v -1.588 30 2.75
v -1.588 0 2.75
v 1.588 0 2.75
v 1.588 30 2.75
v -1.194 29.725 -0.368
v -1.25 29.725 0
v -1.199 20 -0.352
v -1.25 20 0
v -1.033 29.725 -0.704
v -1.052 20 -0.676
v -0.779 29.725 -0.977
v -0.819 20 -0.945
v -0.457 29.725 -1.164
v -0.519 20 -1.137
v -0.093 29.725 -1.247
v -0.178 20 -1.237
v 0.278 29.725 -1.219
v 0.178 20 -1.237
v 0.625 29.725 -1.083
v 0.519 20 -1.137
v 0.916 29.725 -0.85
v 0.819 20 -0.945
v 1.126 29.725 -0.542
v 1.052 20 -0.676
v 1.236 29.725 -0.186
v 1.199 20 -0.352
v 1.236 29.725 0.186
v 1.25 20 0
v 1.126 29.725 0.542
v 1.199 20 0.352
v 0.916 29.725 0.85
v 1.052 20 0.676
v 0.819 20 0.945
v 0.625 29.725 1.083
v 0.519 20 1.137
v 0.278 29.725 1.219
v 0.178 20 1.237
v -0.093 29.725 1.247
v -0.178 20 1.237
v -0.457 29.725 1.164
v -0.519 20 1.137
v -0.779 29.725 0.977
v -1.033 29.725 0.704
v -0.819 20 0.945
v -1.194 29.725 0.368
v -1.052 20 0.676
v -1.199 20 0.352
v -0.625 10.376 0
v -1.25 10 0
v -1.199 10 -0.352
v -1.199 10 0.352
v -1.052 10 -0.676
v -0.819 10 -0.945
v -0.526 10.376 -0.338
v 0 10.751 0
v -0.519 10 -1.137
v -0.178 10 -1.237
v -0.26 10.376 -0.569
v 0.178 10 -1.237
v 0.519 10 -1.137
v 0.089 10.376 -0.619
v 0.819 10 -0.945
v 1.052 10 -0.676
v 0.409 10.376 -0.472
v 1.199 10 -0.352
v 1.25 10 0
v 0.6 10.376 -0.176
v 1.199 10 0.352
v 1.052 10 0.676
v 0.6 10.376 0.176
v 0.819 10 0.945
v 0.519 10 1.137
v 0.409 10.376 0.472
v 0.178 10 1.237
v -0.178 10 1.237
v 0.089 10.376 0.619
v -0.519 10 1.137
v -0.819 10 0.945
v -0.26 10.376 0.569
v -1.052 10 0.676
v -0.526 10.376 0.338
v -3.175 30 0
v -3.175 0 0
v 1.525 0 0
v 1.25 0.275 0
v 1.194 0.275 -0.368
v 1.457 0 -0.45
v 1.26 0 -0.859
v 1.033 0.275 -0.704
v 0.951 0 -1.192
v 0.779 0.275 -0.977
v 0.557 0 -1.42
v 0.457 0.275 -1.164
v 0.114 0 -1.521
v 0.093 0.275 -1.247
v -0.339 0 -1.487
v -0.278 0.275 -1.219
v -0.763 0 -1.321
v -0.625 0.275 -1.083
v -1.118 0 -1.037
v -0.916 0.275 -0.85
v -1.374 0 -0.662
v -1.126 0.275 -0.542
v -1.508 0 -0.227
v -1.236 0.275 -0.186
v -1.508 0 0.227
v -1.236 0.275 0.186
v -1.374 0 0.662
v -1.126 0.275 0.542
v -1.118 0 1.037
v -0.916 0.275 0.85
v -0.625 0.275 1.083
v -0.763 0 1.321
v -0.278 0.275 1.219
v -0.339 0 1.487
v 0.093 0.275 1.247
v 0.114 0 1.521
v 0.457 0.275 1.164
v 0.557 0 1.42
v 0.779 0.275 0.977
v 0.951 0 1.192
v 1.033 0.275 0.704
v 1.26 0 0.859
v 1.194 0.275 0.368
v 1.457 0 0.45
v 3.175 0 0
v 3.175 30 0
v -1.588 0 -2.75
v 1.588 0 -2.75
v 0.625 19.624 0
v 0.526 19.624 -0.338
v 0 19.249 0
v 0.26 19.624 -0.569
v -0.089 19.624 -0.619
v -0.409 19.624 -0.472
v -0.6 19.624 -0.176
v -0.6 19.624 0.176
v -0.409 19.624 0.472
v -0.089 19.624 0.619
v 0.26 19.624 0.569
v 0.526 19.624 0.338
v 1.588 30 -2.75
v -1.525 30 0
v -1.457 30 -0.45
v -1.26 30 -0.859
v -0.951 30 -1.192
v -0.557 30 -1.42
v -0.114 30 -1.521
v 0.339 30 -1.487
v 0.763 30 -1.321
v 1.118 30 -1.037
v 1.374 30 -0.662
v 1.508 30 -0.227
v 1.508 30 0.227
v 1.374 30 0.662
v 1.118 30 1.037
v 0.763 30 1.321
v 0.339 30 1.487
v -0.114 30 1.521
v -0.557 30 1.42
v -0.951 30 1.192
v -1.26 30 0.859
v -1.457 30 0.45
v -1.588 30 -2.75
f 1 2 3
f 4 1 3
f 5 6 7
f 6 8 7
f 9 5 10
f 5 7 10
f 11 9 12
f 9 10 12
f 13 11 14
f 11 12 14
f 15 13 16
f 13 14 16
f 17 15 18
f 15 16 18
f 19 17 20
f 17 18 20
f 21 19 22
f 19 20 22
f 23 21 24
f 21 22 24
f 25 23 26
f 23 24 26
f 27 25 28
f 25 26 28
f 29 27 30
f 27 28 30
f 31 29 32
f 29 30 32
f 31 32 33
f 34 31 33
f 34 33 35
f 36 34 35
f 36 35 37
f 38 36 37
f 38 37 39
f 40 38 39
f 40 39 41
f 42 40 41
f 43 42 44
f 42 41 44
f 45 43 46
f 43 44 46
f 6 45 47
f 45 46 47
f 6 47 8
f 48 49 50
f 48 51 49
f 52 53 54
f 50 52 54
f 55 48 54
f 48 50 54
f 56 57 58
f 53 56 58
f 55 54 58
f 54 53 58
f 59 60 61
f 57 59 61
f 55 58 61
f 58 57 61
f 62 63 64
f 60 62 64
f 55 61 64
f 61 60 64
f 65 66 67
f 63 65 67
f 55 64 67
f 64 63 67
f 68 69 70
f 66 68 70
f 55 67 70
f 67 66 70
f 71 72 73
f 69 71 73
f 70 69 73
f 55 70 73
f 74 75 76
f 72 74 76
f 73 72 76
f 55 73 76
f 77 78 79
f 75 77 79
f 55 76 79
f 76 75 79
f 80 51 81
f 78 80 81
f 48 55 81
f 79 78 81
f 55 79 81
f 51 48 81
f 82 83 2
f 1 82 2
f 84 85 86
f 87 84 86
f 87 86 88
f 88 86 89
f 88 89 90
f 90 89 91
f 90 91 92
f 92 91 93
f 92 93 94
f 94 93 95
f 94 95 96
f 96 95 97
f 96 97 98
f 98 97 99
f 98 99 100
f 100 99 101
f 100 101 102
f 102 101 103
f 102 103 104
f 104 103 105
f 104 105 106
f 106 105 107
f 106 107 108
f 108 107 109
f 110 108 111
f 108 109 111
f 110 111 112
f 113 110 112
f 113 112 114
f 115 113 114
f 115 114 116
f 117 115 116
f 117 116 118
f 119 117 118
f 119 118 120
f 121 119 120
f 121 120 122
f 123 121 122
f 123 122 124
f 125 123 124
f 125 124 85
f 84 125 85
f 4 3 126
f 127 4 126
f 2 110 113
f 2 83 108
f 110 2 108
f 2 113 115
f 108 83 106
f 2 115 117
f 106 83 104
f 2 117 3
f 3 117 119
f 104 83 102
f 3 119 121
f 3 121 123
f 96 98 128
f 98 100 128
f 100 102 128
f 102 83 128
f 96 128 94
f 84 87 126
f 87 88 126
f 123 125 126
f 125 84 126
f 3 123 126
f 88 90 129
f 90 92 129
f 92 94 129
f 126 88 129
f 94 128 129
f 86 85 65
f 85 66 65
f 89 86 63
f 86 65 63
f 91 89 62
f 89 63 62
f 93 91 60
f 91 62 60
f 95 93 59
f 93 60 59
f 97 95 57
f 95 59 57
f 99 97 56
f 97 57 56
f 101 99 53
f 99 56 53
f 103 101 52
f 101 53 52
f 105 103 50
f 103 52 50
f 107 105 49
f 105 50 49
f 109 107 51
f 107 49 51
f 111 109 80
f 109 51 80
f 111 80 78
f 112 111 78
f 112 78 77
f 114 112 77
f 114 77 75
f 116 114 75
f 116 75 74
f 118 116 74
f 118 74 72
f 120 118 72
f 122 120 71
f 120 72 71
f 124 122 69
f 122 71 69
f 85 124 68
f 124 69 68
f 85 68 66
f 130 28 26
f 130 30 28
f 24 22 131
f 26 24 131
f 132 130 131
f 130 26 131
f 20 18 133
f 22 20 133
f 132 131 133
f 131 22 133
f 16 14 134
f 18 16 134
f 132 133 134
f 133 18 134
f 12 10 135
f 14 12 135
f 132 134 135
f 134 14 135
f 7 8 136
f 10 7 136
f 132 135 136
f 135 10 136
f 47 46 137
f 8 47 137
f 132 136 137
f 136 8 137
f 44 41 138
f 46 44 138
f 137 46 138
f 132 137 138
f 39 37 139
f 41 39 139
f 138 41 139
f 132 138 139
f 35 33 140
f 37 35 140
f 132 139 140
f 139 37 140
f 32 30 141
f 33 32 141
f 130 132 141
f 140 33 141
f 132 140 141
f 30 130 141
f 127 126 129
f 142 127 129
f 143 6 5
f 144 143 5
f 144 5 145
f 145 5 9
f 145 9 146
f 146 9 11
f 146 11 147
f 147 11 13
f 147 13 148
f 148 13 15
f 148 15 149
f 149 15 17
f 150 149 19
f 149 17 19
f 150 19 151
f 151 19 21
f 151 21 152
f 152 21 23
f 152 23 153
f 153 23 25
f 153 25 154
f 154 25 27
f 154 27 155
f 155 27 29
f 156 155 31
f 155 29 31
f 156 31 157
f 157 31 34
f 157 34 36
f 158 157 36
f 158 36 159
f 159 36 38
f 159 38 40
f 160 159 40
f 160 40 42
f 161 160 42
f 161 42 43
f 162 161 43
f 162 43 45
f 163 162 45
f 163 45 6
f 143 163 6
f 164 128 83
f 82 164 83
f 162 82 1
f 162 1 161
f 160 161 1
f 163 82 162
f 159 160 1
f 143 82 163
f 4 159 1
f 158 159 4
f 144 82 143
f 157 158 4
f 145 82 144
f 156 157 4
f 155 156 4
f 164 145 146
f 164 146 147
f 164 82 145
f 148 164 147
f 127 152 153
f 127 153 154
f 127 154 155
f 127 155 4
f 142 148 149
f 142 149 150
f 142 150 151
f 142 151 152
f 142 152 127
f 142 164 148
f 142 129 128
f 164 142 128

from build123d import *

# Parameters (mm, degrees)
EXTRUDE_1_DEPTH             = 30
M3_TAPPED_HOLE1_D           = 2.5
M3_TAPPED_HOLE1_DEPTH       = 10
M3_TAPPED_HOLE1_CSINK_D     = 3.05
M3_TAPPED_HOLE1_CSINK_ANGLE = 90
M3_TAPPED_HOLE1_TIP         = 0.751075774
M3_TAPPED_HOLE2_D           = 2.5
M3_TAPPED_HOLE2_DEPTH       = 10
M3_TAPPED_HOLE2_CSINK_D     = 3.05
M3_TAPPED_HOLE2_CSINK_ANGLE = 90
M3_TAPPED_HOLE2_TIP         = 0.751075774


with BuildPart() as part:
    # 草图1 → 凸台-拉伸1 (new body)
    with BuildSketch(Plane(origin=(0, 0, 0), x_dir=(1, 0, 0), z_dir=(0, 1, 0))):
        Polygon((3.175426481, 0), (1.58771324, 2.75), (-1.58771324, 2.75), (-3.175426481, 0), (-1.58771324, -2.75), (1.58771324, -2.75), align=None)
    extrude(amount=EXTRUDE_1_DEPTH)

    # M3 Tapped Hole1
    with Locations(Plane(origin=(0, 30, 0), x_dir=(1, 0, 0), z_dir=(0, 1, 0))):
        with Locations((0, 0)):
            CounterSinkHole(M3_TAPPED_HOLE1_D / 2, M3_TAPPED_HOLE1_CSINK_D / 2, depth=M3_TAPPED_HOLE1_DEPTH, counter_sink_angle=M3_TAPPED_HOLE1_CSINK_ANGLE)
            with Locations((0, 0, -(M3_TAPPED_HOLE1_DEPTH + M3_TAPPED_HOLE1_TIP / 2))):  # 118° drill point
                Cone(0, M3_TAPPED_HOLE1_D / 2, M3_TAPPED_HOLE1_TIP, mode=Mode.SUBTRACT)

    # M3 Tapped Hole2
    with Locations(Plane(origin=(0, 0, 0), x_dir=(-1, 0, 0), z_dir=(0, -1, 0))):
        with Locations((0, 0)):
            CounterSinkHole(M3_TAPPED_HOLE2_D / 2, M3_TAPPED_HOLE2_CSINK_D / 2, depth=M3_TAPPED_HOLE2_DEPTH, counter_sink_angle=M3_TAPPED_HOLE2_CSINK_ANGLE)
            with Locations((0, 0, -(M3_TAPPED_HOLE2_DEPTH + M3_TAPPED_HOLE2_TIP / 2))):  # 118° drill point
                Cone(0, M3_TAPPED_HOLE2_D / 2, M3_TAPPED_HOLE2_TIP, mode=Mode.SUBTRACT)


solid = part.part
